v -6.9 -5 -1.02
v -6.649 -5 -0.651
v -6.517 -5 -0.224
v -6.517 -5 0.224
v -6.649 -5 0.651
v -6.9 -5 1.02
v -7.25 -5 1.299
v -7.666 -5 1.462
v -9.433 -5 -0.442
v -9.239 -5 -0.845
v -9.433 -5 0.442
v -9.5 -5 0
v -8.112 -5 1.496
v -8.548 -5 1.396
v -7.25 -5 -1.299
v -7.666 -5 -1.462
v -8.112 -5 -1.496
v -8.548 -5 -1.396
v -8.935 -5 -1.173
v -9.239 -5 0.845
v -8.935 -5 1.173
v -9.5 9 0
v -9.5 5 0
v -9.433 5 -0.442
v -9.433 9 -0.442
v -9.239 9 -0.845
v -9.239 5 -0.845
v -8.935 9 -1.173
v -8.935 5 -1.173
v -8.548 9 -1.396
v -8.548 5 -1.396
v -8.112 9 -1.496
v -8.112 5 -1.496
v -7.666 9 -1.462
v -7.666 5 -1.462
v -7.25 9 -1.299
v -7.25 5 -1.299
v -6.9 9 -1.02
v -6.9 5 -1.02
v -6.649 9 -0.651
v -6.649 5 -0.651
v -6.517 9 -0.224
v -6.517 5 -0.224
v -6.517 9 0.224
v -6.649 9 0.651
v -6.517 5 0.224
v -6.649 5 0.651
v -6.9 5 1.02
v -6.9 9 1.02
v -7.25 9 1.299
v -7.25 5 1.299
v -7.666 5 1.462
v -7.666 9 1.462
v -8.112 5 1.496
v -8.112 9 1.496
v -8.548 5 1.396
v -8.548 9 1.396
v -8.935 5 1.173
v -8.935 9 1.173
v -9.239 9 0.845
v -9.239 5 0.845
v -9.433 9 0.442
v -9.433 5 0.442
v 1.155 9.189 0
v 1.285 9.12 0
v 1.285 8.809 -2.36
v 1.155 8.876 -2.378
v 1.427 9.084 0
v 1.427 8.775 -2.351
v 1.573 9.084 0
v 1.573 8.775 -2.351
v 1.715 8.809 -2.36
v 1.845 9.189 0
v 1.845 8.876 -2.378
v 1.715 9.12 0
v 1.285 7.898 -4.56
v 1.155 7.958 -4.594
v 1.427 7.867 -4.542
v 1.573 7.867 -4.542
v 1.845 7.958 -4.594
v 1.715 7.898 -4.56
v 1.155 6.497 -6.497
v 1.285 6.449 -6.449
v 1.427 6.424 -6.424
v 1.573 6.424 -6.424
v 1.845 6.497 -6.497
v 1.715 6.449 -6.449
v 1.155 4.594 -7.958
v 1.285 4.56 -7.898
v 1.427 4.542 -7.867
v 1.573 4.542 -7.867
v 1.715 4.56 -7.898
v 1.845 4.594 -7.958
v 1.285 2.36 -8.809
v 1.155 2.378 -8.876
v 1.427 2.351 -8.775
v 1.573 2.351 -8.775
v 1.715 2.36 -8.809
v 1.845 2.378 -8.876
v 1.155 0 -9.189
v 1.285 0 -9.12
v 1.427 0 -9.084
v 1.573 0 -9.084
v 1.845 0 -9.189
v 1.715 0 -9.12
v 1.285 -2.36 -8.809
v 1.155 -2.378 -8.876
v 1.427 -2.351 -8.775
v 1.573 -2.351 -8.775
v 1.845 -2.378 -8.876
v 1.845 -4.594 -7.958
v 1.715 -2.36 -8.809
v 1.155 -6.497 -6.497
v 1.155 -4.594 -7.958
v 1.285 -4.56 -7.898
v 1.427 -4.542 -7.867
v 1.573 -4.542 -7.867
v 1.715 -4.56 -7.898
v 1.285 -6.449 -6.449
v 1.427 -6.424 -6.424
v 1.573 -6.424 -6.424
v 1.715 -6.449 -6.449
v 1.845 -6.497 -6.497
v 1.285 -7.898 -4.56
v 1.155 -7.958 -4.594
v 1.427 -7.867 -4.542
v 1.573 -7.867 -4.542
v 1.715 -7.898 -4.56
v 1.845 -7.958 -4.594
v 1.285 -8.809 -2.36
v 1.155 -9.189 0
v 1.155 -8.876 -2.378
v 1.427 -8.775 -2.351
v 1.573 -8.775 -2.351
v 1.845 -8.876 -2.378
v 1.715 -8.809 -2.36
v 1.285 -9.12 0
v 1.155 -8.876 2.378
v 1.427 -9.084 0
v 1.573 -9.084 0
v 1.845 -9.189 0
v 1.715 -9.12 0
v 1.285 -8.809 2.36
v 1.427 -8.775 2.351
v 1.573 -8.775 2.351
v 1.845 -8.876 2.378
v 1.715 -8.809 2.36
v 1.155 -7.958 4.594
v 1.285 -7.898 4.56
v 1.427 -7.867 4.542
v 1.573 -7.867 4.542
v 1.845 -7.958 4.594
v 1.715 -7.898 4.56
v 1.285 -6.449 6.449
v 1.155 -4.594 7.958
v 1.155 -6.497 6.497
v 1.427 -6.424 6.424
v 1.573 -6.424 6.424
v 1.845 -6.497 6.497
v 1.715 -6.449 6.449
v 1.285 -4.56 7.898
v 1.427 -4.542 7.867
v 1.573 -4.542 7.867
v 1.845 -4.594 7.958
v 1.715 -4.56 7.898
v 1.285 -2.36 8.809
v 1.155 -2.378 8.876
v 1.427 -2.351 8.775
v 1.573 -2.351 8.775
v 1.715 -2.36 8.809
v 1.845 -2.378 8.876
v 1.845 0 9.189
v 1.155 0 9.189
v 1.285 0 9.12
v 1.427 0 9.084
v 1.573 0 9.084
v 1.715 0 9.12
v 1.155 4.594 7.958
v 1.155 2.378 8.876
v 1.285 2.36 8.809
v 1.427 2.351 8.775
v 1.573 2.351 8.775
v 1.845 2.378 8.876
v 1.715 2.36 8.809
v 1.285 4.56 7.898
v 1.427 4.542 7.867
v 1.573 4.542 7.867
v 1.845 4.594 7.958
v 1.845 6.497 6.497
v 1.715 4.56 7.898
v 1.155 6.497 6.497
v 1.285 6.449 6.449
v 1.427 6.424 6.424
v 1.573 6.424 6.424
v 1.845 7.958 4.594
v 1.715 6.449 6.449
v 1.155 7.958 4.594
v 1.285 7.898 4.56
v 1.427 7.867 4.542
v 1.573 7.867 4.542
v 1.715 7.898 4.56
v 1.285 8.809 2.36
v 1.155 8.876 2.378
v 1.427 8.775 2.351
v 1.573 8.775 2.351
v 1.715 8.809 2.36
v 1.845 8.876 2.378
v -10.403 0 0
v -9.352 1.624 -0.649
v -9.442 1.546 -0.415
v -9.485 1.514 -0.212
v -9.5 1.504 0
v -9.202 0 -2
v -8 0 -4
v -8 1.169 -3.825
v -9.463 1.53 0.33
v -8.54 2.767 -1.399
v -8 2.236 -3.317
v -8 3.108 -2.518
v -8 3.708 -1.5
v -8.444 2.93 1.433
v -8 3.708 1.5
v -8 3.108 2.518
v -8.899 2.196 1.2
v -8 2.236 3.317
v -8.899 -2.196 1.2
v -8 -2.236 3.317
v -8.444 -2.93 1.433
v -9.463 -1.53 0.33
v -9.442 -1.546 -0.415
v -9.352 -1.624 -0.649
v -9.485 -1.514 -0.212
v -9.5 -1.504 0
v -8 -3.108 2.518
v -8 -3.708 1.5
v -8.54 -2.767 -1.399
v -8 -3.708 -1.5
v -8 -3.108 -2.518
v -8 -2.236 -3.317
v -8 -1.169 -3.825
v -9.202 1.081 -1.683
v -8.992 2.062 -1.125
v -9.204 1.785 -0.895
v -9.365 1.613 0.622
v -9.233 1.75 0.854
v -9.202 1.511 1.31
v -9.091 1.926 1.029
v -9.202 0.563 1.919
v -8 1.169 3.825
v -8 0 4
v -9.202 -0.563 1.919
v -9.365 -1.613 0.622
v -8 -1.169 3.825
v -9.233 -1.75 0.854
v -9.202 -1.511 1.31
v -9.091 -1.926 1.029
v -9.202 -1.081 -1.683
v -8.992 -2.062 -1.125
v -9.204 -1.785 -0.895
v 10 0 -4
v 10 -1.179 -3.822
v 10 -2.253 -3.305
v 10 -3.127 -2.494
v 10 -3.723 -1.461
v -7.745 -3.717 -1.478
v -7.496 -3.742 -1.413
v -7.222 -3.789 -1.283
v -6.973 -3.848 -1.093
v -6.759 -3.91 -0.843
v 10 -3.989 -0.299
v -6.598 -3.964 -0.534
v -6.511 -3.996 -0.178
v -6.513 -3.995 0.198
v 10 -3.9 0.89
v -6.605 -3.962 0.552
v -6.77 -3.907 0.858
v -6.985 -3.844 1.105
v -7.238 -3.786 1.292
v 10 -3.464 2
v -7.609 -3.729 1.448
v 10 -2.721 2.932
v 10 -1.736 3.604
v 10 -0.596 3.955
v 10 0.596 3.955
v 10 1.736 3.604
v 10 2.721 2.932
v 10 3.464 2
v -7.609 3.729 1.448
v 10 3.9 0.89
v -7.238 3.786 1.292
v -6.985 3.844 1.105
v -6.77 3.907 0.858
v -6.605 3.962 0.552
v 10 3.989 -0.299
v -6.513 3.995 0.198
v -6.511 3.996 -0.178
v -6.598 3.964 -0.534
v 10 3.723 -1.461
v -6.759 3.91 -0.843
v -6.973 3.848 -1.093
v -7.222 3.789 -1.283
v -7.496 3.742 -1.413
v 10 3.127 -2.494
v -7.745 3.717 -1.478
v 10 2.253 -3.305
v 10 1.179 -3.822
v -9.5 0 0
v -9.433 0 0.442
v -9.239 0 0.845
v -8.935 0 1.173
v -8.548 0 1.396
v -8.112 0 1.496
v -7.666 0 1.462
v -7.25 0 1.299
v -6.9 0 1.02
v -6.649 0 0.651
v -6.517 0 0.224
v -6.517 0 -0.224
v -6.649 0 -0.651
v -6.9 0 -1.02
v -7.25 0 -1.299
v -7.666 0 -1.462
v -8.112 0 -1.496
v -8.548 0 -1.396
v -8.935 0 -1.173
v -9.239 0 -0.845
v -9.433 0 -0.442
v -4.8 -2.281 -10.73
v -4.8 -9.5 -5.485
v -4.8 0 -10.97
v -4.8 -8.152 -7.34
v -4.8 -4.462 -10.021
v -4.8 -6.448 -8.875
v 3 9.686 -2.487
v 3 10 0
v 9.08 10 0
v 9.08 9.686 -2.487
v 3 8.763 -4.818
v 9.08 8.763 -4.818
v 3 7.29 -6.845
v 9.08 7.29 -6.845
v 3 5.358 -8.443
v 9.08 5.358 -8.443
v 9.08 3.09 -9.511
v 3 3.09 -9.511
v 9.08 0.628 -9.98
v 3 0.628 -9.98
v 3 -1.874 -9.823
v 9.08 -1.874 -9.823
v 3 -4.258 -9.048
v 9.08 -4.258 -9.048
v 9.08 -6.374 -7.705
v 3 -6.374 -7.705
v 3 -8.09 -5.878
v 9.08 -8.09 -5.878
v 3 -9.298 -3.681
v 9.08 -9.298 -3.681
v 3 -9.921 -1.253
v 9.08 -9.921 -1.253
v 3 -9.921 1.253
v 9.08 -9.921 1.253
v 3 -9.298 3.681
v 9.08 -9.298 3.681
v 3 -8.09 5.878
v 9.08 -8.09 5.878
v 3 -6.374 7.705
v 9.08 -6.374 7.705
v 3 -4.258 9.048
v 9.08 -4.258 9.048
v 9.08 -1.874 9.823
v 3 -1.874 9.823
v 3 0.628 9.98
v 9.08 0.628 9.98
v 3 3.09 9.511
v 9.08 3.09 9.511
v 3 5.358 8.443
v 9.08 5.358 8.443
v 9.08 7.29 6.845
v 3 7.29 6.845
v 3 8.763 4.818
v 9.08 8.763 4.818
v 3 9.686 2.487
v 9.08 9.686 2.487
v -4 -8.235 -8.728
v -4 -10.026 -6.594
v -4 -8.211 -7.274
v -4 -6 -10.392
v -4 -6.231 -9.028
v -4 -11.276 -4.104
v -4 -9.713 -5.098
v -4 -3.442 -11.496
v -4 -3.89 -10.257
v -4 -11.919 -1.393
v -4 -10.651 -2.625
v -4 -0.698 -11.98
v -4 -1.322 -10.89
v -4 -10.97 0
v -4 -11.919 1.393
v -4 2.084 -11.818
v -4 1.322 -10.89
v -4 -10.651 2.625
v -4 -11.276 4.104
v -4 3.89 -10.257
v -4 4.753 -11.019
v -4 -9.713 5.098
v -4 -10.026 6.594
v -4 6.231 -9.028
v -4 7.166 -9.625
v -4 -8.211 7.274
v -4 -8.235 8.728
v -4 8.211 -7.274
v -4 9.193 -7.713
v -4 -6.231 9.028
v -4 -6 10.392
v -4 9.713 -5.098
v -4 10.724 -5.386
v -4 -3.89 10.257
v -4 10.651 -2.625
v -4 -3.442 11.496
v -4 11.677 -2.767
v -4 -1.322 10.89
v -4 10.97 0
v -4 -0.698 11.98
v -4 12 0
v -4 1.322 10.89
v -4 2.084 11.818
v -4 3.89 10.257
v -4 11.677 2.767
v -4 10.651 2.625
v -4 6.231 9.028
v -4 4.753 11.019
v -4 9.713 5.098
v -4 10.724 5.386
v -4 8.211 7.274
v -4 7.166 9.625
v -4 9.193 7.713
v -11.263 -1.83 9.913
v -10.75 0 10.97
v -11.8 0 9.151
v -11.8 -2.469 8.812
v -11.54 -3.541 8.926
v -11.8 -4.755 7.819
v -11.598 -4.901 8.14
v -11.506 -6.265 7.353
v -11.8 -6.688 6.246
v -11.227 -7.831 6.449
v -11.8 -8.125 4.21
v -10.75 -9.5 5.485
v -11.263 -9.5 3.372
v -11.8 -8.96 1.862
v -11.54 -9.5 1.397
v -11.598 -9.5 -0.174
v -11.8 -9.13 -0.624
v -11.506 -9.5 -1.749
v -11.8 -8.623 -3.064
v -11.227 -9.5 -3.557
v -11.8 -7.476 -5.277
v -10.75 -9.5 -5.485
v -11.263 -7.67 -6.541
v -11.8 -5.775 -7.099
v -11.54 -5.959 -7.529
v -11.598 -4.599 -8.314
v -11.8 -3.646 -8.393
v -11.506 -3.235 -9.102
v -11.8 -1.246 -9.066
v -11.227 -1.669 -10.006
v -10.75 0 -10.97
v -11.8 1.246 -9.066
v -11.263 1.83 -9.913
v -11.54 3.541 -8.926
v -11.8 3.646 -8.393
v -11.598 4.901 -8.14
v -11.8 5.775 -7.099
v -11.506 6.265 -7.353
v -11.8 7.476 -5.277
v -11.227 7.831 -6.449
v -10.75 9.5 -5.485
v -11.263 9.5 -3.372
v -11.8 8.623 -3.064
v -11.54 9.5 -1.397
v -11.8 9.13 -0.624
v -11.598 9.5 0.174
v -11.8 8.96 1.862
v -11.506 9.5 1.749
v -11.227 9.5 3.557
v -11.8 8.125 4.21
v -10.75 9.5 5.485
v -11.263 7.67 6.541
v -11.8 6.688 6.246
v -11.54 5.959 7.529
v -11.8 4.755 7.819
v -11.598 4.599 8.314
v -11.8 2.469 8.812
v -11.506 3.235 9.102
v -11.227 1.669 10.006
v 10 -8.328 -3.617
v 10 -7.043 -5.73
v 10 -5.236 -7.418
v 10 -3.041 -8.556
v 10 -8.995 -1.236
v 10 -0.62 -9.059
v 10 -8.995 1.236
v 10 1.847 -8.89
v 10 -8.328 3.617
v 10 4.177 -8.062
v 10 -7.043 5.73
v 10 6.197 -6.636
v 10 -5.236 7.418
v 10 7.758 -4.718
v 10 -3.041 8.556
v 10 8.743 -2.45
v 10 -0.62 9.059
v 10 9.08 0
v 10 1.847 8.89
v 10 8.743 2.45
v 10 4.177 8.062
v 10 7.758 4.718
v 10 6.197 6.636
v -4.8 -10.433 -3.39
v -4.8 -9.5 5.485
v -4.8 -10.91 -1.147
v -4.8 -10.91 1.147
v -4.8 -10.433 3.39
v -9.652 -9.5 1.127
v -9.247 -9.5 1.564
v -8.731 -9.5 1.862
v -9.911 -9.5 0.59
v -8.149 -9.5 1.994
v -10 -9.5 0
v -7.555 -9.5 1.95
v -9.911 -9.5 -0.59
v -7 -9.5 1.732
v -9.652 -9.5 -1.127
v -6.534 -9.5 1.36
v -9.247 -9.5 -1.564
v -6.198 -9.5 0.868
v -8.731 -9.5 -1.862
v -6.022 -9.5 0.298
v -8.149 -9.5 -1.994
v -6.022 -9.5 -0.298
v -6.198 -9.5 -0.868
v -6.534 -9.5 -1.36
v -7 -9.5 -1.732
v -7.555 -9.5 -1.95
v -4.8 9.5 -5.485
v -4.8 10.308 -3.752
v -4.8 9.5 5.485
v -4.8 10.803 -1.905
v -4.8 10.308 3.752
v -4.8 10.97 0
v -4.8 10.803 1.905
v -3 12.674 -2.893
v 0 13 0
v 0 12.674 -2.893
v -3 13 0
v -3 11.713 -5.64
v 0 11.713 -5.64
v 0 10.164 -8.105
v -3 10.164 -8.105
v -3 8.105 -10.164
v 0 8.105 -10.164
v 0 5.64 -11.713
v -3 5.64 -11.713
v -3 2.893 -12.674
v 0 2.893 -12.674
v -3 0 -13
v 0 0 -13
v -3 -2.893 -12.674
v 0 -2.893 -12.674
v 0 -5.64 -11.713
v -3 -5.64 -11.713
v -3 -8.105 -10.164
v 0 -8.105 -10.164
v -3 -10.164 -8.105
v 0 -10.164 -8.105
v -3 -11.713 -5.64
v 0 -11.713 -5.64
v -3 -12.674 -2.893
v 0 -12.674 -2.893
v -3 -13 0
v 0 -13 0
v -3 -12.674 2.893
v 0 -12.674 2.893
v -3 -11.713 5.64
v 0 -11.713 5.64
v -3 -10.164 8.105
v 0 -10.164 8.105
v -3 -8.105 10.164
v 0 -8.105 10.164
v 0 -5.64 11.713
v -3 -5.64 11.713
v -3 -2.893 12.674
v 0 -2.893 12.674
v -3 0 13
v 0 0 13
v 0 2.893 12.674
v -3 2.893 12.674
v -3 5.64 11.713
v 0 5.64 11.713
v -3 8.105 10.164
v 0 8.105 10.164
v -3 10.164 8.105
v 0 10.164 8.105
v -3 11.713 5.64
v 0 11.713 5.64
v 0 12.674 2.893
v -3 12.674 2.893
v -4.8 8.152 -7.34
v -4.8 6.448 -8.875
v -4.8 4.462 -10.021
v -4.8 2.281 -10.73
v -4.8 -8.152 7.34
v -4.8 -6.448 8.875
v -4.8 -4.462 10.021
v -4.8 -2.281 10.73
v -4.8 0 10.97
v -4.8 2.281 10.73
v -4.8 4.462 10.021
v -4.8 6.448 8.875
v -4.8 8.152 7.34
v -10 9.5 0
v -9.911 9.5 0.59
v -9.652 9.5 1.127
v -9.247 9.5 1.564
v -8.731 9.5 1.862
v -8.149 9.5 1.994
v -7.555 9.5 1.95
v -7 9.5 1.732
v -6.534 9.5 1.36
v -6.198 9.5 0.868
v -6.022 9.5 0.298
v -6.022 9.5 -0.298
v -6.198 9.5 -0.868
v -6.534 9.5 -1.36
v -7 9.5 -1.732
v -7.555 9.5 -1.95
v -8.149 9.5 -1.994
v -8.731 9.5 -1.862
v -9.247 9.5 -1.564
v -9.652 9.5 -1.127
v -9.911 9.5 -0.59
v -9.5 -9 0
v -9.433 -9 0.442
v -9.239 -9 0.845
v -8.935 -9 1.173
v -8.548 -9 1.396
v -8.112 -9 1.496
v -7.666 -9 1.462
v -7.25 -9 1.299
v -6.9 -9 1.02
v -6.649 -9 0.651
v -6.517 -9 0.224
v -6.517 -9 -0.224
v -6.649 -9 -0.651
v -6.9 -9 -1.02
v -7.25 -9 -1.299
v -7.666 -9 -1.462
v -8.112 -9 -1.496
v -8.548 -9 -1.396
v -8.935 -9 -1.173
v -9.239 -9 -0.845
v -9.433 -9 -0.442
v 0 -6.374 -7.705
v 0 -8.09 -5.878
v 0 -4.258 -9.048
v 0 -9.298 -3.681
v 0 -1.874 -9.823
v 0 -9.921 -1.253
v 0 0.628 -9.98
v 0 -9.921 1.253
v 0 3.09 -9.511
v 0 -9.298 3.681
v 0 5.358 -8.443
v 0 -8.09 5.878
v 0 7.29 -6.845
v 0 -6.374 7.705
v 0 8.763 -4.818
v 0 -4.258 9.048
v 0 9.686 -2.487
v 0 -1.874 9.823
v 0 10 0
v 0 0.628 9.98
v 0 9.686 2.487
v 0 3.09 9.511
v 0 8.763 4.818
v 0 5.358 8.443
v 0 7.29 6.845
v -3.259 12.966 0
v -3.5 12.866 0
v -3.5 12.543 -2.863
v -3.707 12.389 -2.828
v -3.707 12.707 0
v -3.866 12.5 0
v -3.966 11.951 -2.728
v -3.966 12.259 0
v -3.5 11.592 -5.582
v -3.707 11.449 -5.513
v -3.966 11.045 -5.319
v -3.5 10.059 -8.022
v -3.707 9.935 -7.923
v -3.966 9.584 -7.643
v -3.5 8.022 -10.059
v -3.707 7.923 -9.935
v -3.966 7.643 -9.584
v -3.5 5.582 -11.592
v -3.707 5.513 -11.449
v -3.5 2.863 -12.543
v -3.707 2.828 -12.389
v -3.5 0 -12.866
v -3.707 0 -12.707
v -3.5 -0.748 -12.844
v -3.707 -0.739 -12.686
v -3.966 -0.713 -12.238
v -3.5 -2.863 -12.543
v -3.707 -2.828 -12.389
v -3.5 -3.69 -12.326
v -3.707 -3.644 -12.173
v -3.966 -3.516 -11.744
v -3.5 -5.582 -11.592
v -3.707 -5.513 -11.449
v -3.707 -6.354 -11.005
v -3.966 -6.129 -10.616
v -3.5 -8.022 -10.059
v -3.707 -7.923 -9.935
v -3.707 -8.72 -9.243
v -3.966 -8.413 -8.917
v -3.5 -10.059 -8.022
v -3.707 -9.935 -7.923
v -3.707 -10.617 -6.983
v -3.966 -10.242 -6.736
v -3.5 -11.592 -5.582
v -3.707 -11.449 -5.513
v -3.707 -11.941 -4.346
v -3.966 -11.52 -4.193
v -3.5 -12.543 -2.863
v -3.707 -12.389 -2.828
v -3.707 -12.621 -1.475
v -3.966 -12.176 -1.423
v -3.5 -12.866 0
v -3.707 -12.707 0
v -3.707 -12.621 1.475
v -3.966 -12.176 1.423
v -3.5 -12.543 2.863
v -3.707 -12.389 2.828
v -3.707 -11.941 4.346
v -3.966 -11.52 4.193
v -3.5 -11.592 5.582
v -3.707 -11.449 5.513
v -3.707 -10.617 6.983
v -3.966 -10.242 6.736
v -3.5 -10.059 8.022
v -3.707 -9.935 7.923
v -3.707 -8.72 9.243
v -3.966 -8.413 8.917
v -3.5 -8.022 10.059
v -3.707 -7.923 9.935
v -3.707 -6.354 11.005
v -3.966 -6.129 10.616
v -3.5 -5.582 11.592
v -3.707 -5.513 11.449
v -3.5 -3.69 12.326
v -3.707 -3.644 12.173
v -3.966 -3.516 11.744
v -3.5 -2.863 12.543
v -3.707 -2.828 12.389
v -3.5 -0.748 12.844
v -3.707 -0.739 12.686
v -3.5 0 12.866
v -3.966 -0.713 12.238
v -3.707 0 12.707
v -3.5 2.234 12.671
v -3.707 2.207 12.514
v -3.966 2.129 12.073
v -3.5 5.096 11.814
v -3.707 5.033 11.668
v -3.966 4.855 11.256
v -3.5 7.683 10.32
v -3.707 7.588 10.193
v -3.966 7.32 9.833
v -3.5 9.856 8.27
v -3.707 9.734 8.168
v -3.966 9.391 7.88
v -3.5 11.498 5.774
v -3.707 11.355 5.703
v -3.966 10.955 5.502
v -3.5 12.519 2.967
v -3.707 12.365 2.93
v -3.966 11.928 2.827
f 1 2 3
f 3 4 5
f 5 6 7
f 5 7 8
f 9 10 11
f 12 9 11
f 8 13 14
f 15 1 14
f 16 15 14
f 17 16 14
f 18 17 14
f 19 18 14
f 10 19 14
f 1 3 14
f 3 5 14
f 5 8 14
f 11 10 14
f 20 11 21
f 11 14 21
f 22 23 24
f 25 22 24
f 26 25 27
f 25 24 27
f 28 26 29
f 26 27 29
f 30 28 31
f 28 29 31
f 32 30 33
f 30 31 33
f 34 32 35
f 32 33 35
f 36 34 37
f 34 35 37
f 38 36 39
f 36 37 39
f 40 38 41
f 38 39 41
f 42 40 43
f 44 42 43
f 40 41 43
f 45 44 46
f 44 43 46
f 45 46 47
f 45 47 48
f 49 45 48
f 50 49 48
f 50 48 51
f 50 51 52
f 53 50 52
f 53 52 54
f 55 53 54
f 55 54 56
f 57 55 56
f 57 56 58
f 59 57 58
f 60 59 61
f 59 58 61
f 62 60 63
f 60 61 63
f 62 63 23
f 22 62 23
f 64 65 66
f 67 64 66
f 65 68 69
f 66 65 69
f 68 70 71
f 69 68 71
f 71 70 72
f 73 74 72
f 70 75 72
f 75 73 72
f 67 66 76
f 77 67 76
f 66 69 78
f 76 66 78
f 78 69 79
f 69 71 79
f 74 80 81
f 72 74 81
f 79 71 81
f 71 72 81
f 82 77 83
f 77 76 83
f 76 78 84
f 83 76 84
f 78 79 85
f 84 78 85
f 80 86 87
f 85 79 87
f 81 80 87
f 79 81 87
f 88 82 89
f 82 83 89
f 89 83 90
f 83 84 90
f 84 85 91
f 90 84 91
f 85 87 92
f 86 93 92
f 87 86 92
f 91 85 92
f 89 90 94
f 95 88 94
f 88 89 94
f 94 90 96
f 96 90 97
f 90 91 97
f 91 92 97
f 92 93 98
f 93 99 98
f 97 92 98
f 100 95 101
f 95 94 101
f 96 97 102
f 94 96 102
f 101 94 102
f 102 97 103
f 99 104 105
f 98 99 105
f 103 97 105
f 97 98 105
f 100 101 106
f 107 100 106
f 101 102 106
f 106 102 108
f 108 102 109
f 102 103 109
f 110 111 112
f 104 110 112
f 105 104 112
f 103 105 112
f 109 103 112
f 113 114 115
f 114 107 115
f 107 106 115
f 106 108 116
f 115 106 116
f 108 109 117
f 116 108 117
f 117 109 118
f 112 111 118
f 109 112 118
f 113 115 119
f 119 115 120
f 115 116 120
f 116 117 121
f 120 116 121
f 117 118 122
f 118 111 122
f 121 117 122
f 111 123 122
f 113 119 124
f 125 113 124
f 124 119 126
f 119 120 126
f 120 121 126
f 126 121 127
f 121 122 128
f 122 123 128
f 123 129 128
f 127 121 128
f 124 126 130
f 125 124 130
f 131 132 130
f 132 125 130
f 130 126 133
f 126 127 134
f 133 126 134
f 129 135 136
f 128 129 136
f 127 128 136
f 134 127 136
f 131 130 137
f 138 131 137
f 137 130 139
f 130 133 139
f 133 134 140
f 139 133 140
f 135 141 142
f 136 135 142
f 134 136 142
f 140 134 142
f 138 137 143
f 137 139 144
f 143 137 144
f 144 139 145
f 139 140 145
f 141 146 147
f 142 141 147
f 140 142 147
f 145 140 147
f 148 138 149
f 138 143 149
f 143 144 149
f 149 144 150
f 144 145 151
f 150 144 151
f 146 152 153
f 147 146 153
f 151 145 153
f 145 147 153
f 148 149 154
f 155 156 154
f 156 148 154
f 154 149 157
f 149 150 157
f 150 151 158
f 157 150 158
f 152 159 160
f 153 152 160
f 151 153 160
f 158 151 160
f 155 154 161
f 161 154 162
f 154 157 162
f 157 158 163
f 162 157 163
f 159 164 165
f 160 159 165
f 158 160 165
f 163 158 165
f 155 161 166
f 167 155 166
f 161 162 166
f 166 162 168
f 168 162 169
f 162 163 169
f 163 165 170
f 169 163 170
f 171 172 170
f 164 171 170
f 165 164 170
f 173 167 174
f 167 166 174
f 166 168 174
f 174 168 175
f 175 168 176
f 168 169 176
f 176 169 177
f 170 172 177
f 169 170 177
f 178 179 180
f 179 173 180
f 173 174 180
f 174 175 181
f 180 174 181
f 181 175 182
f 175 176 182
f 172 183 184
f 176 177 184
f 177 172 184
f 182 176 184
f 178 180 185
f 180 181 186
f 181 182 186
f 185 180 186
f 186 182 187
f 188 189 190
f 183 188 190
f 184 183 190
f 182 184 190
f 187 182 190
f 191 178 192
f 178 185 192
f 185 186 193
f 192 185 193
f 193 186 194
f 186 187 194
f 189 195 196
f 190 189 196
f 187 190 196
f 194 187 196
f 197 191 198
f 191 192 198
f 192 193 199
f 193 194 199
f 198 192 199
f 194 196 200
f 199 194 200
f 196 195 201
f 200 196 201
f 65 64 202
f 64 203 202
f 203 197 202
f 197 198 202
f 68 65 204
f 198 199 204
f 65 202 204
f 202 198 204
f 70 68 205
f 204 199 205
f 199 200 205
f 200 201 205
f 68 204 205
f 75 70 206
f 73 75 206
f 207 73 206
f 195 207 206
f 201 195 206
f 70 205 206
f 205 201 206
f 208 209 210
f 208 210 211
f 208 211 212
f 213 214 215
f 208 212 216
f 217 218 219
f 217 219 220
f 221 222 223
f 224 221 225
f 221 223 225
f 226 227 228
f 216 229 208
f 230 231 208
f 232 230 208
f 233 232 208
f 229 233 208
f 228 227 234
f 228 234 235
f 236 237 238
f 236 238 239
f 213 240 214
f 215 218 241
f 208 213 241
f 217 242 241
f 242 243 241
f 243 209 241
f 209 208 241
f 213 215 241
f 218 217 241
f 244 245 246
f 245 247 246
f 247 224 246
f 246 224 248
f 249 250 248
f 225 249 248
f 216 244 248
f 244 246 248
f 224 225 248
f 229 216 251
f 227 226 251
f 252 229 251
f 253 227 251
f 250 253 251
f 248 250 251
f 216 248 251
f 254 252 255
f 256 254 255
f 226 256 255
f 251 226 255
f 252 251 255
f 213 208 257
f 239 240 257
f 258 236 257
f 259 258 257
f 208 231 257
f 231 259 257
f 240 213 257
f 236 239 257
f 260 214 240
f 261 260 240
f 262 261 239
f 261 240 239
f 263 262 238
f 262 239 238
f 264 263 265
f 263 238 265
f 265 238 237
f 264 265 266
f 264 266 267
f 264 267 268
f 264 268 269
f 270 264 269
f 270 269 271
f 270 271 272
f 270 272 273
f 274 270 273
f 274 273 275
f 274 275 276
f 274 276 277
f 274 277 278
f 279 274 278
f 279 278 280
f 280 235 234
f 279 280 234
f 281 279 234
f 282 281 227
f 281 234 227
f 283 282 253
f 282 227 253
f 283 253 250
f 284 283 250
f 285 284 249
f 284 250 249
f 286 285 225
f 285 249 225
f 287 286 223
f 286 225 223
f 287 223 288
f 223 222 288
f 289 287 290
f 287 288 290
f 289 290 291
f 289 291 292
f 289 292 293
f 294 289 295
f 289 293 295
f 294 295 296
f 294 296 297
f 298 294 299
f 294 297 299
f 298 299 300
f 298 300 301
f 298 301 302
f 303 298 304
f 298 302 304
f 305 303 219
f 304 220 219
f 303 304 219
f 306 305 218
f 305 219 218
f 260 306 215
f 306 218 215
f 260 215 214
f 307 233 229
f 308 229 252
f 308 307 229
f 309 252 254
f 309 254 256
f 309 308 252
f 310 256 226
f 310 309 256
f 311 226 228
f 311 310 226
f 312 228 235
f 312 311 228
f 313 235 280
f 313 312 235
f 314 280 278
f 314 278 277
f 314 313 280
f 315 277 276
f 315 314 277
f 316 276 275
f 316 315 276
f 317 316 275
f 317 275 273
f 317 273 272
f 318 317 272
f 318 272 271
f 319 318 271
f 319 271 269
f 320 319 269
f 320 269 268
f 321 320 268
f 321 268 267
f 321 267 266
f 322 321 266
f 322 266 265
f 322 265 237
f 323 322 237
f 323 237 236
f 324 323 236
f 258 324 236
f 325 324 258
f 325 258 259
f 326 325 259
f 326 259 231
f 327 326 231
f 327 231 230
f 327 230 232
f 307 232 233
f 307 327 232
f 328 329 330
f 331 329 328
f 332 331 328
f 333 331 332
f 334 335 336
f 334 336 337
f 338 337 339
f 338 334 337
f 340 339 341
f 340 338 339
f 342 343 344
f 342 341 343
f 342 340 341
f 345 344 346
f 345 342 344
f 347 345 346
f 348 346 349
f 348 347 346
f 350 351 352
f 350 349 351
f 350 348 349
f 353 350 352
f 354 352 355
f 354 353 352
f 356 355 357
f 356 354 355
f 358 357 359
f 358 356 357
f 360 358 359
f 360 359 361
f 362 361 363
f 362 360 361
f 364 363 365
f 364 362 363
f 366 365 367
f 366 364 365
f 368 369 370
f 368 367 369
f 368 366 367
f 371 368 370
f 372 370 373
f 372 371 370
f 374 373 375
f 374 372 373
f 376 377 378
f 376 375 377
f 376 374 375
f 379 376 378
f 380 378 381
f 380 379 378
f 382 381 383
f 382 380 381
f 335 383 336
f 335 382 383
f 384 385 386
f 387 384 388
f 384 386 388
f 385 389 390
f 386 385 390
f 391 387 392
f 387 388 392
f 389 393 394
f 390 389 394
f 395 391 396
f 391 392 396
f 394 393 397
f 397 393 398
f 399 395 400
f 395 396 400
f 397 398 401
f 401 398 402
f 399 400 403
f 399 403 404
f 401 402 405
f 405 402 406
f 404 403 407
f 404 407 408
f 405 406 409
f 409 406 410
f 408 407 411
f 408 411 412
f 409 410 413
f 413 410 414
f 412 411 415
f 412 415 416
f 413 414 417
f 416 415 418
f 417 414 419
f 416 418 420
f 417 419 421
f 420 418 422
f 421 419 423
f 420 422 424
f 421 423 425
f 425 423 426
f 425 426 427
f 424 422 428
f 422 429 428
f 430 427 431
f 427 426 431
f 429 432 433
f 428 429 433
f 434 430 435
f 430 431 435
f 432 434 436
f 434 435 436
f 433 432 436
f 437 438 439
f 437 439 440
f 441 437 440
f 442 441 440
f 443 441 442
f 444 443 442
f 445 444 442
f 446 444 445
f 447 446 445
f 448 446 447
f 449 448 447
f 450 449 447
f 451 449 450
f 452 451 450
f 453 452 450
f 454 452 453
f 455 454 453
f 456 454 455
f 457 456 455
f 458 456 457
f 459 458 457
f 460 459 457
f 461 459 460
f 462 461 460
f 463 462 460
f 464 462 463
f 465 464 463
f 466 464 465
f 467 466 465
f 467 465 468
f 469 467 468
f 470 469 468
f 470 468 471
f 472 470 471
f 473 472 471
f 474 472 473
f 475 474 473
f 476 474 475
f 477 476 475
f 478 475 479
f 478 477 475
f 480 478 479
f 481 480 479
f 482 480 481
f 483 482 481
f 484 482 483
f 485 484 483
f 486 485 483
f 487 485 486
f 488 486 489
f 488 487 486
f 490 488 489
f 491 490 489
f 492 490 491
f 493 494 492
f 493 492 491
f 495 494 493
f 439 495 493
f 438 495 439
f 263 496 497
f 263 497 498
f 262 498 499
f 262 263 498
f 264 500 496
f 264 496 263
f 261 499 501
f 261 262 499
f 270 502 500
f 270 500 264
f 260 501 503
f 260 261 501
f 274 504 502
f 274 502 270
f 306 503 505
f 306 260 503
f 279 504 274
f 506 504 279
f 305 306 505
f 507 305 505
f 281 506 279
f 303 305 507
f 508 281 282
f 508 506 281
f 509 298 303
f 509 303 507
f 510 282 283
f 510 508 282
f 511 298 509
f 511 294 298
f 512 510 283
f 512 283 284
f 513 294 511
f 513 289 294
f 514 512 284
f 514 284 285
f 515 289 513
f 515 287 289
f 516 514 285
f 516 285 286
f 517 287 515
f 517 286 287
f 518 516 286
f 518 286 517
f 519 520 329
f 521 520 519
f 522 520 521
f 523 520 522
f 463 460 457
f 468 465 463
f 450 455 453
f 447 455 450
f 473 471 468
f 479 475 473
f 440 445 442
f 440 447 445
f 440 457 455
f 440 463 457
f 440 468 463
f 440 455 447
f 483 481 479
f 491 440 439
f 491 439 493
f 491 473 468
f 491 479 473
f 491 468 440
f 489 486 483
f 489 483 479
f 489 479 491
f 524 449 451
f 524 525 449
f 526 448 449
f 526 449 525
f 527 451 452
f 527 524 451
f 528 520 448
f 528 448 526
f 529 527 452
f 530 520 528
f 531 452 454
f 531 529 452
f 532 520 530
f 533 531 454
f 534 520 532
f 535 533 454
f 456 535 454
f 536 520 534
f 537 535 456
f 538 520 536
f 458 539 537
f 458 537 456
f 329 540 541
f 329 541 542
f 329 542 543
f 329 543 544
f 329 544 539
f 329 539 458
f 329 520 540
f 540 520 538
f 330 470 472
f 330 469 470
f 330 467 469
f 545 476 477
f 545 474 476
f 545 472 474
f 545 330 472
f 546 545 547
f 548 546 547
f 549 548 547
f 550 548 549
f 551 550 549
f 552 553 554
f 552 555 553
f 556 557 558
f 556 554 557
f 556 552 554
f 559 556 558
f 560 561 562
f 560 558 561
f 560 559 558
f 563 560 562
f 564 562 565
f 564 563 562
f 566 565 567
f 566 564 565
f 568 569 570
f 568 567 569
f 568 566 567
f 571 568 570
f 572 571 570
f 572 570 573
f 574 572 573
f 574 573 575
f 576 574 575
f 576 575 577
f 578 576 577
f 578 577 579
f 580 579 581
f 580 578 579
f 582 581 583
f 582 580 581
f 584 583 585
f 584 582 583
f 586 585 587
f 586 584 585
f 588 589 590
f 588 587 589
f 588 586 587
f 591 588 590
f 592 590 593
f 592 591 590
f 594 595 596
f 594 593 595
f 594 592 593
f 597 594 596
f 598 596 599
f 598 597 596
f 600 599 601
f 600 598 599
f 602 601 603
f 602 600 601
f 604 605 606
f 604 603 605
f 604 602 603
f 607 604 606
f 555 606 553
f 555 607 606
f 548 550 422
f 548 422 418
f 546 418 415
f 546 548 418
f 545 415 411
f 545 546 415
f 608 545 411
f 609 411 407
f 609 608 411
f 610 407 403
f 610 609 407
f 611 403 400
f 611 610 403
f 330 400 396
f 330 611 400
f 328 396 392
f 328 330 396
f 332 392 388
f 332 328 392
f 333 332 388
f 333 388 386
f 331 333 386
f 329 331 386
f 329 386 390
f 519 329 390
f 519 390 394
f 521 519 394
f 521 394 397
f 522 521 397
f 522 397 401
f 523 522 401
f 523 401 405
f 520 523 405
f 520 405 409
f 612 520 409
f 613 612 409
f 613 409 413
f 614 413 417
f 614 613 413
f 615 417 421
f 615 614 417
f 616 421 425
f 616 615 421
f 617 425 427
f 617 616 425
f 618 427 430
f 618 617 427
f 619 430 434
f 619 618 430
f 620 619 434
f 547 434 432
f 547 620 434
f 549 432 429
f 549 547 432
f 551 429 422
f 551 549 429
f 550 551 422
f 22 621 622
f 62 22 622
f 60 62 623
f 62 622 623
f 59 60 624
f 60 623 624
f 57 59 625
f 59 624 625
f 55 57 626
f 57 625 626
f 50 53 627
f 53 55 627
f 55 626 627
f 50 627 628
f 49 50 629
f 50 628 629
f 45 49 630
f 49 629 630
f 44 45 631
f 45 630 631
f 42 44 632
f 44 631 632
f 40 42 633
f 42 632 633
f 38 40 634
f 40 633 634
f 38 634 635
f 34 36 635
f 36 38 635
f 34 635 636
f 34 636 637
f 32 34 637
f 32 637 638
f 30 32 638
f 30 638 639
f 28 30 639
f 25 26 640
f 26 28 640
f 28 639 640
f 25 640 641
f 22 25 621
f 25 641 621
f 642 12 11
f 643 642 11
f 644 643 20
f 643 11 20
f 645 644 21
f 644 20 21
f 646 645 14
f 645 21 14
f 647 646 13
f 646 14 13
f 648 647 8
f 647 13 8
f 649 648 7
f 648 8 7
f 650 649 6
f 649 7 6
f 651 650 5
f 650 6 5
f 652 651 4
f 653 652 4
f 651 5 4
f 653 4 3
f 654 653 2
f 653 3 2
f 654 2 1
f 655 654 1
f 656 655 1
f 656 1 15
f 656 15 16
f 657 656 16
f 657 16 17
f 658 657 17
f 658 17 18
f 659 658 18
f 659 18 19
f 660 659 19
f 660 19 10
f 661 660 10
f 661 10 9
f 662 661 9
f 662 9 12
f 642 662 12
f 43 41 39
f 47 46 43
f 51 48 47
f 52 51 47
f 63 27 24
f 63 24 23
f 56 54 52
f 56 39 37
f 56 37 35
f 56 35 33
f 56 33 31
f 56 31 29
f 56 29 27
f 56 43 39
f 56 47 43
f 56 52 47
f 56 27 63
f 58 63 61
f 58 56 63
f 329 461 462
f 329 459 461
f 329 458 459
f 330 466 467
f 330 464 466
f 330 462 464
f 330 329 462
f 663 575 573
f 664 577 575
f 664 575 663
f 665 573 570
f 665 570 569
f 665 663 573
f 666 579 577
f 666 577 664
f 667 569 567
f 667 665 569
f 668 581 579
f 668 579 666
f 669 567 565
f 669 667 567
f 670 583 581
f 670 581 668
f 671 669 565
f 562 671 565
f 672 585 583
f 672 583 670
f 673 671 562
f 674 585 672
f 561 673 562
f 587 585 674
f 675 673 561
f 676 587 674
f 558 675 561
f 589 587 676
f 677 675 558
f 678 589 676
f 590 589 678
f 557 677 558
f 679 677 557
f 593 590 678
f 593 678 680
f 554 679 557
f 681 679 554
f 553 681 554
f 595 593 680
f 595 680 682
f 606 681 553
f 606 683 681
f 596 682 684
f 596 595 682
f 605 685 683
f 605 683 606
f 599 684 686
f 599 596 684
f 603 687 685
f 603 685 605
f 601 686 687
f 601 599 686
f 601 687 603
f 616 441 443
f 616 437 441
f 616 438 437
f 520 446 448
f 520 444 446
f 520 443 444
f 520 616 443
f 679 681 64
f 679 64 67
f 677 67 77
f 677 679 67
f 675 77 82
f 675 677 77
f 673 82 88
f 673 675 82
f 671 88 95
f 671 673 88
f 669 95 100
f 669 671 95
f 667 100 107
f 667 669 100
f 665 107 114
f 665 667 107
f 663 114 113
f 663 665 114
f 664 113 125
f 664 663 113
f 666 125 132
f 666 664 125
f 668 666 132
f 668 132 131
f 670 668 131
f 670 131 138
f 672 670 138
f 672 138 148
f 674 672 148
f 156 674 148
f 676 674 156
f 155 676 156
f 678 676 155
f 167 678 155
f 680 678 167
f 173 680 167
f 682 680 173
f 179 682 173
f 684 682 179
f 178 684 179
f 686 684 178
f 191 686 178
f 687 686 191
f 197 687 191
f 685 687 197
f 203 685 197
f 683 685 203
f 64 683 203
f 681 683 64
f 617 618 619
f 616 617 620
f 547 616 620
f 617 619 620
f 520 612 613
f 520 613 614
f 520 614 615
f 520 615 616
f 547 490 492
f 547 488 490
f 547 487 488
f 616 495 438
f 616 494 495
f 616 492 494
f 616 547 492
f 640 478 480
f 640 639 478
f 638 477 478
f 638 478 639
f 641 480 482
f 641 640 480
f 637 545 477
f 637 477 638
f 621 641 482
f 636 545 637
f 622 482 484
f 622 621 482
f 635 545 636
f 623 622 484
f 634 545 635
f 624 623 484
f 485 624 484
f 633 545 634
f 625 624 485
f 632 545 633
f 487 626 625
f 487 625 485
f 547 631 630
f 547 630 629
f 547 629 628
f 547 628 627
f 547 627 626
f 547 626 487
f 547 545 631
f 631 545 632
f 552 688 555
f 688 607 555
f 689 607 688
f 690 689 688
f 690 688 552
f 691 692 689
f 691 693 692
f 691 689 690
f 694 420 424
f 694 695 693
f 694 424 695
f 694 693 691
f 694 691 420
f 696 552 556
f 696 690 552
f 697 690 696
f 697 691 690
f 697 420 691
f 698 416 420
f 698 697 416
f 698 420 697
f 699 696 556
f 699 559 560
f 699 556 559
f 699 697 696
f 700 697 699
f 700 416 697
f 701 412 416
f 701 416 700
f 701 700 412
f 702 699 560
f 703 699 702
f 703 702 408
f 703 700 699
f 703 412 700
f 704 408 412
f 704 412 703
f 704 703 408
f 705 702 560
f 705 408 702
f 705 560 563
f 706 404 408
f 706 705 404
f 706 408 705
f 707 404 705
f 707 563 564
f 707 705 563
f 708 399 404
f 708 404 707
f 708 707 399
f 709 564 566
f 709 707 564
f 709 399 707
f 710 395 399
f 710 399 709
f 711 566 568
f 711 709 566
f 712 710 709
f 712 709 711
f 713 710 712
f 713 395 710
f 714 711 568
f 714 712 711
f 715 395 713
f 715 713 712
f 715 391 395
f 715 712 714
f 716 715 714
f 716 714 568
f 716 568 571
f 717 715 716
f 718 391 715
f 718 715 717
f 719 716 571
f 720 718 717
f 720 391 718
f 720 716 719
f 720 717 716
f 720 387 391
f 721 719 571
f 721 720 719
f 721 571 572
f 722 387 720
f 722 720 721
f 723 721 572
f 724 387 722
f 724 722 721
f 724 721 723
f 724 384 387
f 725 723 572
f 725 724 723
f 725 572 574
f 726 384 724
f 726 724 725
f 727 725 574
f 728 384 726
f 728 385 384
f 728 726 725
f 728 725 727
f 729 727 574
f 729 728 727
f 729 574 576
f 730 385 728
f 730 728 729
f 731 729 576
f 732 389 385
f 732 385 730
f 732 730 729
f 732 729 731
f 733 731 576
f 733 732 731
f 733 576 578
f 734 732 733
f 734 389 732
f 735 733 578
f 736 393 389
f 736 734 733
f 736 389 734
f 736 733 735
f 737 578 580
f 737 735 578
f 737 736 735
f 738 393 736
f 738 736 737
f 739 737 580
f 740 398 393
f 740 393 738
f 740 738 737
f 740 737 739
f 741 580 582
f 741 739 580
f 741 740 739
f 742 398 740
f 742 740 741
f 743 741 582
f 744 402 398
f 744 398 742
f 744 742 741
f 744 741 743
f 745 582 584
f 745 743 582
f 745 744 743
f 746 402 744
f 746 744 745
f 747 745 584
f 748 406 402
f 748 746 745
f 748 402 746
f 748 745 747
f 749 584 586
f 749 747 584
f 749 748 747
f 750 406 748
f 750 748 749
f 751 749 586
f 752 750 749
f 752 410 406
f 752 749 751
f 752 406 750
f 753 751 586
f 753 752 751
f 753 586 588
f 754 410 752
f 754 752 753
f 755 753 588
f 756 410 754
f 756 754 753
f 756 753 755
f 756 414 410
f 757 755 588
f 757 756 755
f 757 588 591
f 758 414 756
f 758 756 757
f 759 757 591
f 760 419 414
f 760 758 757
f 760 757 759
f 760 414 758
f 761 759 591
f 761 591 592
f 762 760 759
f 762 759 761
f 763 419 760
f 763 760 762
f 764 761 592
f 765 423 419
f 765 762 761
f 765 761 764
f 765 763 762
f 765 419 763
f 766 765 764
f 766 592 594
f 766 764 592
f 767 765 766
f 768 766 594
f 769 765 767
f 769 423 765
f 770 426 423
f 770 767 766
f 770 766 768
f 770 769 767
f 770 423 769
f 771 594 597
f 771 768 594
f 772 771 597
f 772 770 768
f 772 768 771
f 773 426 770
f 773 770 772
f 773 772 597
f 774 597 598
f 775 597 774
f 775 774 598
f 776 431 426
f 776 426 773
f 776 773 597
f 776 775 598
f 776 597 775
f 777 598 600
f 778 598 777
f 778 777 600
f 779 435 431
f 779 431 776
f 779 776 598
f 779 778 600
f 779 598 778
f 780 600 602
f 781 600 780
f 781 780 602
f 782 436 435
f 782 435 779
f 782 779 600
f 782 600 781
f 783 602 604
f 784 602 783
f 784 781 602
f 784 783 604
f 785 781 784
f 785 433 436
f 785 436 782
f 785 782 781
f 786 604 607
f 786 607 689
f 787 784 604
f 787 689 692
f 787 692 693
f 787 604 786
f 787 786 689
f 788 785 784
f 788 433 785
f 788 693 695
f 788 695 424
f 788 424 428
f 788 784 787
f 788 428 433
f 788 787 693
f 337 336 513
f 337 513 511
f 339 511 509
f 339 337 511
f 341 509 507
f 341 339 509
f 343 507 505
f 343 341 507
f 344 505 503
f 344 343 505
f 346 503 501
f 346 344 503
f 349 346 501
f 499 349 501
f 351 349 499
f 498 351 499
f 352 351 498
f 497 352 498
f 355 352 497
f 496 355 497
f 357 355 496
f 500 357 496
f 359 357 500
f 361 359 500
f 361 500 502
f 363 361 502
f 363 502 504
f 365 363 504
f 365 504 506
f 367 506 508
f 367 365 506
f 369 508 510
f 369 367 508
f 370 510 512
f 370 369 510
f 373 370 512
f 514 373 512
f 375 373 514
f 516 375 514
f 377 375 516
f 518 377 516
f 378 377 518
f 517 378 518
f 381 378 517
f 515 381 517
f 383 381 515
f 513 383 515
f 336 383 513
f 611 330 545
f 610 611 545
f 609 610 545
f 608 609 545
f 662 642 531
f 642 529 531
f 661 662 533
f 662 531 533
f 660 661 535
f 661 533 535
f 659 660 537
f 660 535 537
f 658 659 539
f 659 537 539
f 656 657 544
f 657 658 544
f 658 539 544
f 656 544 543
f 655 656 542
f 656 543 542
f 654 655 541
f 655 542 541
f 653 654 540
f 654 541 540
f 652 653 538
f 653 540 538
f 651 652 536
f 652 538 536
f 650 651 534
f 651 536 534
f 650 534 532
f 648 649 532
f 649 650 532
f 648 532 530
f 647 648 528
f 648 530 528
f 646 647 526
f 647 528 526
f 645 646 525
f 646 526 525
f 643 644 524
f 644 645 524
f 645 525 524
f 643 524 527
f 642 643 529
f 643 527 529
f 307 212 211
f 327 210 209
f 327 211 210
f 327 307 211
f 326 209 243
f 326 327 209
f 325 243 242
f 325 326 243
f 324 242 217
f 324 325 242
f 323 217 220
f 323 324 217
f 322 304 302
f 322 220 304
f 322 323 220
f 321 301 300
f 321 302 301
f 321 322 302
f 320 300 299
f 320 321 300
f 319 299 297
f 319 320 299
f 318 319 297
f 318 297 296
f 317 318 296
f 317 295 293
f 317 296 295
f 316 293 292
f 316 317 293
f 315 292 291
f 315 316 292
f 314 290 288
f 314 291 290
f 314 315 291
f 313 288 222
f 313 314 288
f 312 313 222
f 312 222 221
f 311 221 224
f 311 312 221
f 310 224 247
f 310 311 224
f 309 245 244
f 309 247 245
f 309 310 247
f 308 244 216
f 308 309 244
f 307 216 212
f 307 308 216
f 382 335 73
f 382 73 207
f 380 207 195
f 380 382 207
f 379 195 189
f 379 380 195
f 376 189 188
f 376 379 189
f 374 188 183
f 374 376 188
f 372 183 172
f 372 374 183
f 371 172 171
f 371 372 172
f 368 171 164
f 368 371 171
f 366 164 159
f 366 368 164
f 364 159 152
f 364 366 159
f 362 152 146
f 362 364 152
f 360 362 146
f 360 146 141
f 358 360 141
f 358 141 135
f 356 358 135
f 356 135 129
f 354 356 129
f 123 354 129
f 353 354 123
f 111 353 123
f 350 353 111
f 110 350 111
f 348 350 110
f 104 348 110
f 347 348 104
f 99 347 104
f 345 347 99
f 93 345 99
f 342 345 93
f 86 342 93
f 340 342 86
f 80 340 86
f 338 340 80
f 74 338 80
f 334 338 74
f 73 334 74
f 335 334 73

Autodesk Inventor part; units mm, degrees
ref_plane "YZ Plane" through (0, 0, 0) normal (1, 0, 0) x (0, 1, 0)
ref_plane "XZ Plane" through (0, 0, 0) normal (0, 1, 0) x (-1, 0, 0)
ref_plane "XY Plane" through (0, 0, 0) normal (0, 0, 1) x (1, 0, 0)
sketch "Эскиз1" plane through (0, 0, 0) normal (0, 0, 1) x (1, 0, 0)
  line L0 (10, 0) -> (10, 10)
  line L1 (10, 10) -> (3, 10)
  line L2 (3, 10) -> (1.8448, 9.1888)
  line L3 (1.1552, 9.1888) -> (0, 10)
  line L4 (0, 10) -> (0, 13)
  line L5 (0, 13) -> (-4, 13)
  line L6 (-4, 13) -> (-4, 10.9697)
  line L7 (-4, 10.9697) -> (-4.8, 10.9697)
  line L8 (-4.8, 10.9697) -> (-4.8, 0)
  line L9 (-4.8, 0) -> (10, 0)
  arc A0 (1.1552, 9.1888) -> (1.8448, 9.1888) centre (1.5, 9.6798) ccw
  line L10 (-7.8876, 0) -> (13.7255, 0) projected
  line L11 (0, -2.6) -> (0, 15.6) projected
  line L12 (2.3733, 9.0798) -> (10.6379, 9.0798) construction
  dimension "d0" = 0.6
  dimension "d1" = 20
  dimension "d2" = 26
  dimension "d3" = 10
  dimension "d4" = 3
  dimension "d5" = 1.5
  dimension "d6" = 21.9393
  dimension "d7" = 4
  dimension "d8" = 0.8
  dimension "d10" = 18.1596
revolve "Базовый элемент" add sketch "Эскиз1" angle 360 about axis through (-4.8, 0, 0) along (1, 0, 0)
sketch "Эскиз2" plane through (-4.8, 0, 0) normal (-1, 0, 0) x (0, 0, 1)
  circle A0 centre (0, 0) radius 10.9697 projected
  line L0 (10.9697, 0) -> (5.4848, -9.5)
  line L1 (5.4848, -9.5) -> (-5.4848, -9.5)
  line L2 (-5.4848, -9.5) -> (-10.9697, 0)
  line L3 (-10.9697, 0) -> (-5.4848, 9.5)
  line L4 (-5.4848, 9.5) -> (5.4848, 9.5)
  line L5 (5.4848, 9.5) -> (10.9697, 0)
extrude "С головкой" add sketch "Эскиз2" along normal blind 7 contours L0 L1 L2 L3 L4 L5
fillet "Сопряжение1" radius 1 1 edges at (-4, -13, 0)
sketch "Эскиз3" plane through (0, 0, 0) normal (0, 1, 0) x (-1, 0, 0)
  line L0 (10.75, 10.9697) -> (11.8, 9.151)
  line L1 (11.8, 9.151) -> (11.8, 10.9697)
  line L2 (11.8, 10.9697) -> (10.75, 10.9697)
  line L3 (12.01, 0) -> (10.54, 0) projected
  dimension "d14" = 1.05
  dimension "d15" = 30
revolve "Фаска1" cut sketch "Эскиз3" angle 360 about axis through (-10, 0, 0) along (1, 0, 0)
thread "Резьба1" size "M20x1.5" class "6g" standard "ISO Metric profile" length 10
chamfer "Фаска2" distance 0.9202 distance2 0.9202 1 edges at (10, -10, 0) measured on face at (7.6667, 9.9676, -0.8047)
sketch "Эскиз4" plane through (10, 0, 0) normal (1, 0, 0) x (0, 0, -1)
  point P0 (0, 0)
  point P1 (0, 0)
  point P2 (-18.5467, -33.5081)
hole "Отверстие1" at (10, 0, 0) at (10, -33.5081, 18.5467) direction (-1, 0, 0) diameter 8 depth 18 tip angle 118
sketch "Эскиз5" plane through (0, 0, 0) normal (0, 1, 0) x (-1, 0, 0)
  line L0 (-14.4667, 0) -> (16.8, 0) construction
  line L1 (0, -18.2) -> (0, 18.2) construction
  circle A0 centre (8, 0) radius 1.5
  point P0 (0, 0)
  dimension "d32" = 3
  dimension "d33" = 8
extrude "Выдавливание2" cut sketch "Эскиз5" along normal through all both and the other way through all
extrude "Выдавливание3" add sketch "Эскиз5" along normal mid plane 10
chamfer "Фаска3" distance 0.5 angle 45 2 edges at (-6.5, -9.5, 0) (-6.5, 9.5, 0)
equation "\"d12\" = KOH"
equation "\"d14\" = 0.15 * KOH"
equation "\"d17\" = RR"
equation "\"d20\" = NLG"
equation "\"d18\" = GAL"
equation "\"d19\" = -0.5 * GD1 + 0.5 * NND"
equation "\"d0\" = 0.2 * GAL1"
equation "\"d1\" = NND"
equation "\"d2\" = KOD"
equation "\"d3\" = NLG"
equation "\"d4\" = GAL1"
equation "\"d5\" = 0.5 * GAL1"
equation "\"d6\" = n_D"
equation "\"d7\" = SD"
equation "\"d8\" = PHH"
equation "\"d10\" = GD1"
equation "\"NLG\" = 10"
equation "\"NND\" = 20"
equation "\"SD\" = 4"
equation "\"PHH\" = 0.8"
equation "\"SW\" = 19"
equation "\"GAL1\" = 3"
equation "\"KOH\" = 7"
equation "\"KOD\" = 26"
equation "\"GAL\" = 0.61345 * PTC"
equation "\"RR\" = 1"
equation "\"GD1\" = THREADDIA - 1.2269 * PTC"
equation "\"n_D\" = 1.1547 * SW"
equation "\"GUL\" = 0.61345 * PTC"
equation "\"TOA\" = 30deg"
equation "\"PTC\" = 1.5"
equation "\"THREADDIA\" = 20"
properties part number "CSN 02 1915.21 - M 20 x 10" material "Сталь, мягкая"
